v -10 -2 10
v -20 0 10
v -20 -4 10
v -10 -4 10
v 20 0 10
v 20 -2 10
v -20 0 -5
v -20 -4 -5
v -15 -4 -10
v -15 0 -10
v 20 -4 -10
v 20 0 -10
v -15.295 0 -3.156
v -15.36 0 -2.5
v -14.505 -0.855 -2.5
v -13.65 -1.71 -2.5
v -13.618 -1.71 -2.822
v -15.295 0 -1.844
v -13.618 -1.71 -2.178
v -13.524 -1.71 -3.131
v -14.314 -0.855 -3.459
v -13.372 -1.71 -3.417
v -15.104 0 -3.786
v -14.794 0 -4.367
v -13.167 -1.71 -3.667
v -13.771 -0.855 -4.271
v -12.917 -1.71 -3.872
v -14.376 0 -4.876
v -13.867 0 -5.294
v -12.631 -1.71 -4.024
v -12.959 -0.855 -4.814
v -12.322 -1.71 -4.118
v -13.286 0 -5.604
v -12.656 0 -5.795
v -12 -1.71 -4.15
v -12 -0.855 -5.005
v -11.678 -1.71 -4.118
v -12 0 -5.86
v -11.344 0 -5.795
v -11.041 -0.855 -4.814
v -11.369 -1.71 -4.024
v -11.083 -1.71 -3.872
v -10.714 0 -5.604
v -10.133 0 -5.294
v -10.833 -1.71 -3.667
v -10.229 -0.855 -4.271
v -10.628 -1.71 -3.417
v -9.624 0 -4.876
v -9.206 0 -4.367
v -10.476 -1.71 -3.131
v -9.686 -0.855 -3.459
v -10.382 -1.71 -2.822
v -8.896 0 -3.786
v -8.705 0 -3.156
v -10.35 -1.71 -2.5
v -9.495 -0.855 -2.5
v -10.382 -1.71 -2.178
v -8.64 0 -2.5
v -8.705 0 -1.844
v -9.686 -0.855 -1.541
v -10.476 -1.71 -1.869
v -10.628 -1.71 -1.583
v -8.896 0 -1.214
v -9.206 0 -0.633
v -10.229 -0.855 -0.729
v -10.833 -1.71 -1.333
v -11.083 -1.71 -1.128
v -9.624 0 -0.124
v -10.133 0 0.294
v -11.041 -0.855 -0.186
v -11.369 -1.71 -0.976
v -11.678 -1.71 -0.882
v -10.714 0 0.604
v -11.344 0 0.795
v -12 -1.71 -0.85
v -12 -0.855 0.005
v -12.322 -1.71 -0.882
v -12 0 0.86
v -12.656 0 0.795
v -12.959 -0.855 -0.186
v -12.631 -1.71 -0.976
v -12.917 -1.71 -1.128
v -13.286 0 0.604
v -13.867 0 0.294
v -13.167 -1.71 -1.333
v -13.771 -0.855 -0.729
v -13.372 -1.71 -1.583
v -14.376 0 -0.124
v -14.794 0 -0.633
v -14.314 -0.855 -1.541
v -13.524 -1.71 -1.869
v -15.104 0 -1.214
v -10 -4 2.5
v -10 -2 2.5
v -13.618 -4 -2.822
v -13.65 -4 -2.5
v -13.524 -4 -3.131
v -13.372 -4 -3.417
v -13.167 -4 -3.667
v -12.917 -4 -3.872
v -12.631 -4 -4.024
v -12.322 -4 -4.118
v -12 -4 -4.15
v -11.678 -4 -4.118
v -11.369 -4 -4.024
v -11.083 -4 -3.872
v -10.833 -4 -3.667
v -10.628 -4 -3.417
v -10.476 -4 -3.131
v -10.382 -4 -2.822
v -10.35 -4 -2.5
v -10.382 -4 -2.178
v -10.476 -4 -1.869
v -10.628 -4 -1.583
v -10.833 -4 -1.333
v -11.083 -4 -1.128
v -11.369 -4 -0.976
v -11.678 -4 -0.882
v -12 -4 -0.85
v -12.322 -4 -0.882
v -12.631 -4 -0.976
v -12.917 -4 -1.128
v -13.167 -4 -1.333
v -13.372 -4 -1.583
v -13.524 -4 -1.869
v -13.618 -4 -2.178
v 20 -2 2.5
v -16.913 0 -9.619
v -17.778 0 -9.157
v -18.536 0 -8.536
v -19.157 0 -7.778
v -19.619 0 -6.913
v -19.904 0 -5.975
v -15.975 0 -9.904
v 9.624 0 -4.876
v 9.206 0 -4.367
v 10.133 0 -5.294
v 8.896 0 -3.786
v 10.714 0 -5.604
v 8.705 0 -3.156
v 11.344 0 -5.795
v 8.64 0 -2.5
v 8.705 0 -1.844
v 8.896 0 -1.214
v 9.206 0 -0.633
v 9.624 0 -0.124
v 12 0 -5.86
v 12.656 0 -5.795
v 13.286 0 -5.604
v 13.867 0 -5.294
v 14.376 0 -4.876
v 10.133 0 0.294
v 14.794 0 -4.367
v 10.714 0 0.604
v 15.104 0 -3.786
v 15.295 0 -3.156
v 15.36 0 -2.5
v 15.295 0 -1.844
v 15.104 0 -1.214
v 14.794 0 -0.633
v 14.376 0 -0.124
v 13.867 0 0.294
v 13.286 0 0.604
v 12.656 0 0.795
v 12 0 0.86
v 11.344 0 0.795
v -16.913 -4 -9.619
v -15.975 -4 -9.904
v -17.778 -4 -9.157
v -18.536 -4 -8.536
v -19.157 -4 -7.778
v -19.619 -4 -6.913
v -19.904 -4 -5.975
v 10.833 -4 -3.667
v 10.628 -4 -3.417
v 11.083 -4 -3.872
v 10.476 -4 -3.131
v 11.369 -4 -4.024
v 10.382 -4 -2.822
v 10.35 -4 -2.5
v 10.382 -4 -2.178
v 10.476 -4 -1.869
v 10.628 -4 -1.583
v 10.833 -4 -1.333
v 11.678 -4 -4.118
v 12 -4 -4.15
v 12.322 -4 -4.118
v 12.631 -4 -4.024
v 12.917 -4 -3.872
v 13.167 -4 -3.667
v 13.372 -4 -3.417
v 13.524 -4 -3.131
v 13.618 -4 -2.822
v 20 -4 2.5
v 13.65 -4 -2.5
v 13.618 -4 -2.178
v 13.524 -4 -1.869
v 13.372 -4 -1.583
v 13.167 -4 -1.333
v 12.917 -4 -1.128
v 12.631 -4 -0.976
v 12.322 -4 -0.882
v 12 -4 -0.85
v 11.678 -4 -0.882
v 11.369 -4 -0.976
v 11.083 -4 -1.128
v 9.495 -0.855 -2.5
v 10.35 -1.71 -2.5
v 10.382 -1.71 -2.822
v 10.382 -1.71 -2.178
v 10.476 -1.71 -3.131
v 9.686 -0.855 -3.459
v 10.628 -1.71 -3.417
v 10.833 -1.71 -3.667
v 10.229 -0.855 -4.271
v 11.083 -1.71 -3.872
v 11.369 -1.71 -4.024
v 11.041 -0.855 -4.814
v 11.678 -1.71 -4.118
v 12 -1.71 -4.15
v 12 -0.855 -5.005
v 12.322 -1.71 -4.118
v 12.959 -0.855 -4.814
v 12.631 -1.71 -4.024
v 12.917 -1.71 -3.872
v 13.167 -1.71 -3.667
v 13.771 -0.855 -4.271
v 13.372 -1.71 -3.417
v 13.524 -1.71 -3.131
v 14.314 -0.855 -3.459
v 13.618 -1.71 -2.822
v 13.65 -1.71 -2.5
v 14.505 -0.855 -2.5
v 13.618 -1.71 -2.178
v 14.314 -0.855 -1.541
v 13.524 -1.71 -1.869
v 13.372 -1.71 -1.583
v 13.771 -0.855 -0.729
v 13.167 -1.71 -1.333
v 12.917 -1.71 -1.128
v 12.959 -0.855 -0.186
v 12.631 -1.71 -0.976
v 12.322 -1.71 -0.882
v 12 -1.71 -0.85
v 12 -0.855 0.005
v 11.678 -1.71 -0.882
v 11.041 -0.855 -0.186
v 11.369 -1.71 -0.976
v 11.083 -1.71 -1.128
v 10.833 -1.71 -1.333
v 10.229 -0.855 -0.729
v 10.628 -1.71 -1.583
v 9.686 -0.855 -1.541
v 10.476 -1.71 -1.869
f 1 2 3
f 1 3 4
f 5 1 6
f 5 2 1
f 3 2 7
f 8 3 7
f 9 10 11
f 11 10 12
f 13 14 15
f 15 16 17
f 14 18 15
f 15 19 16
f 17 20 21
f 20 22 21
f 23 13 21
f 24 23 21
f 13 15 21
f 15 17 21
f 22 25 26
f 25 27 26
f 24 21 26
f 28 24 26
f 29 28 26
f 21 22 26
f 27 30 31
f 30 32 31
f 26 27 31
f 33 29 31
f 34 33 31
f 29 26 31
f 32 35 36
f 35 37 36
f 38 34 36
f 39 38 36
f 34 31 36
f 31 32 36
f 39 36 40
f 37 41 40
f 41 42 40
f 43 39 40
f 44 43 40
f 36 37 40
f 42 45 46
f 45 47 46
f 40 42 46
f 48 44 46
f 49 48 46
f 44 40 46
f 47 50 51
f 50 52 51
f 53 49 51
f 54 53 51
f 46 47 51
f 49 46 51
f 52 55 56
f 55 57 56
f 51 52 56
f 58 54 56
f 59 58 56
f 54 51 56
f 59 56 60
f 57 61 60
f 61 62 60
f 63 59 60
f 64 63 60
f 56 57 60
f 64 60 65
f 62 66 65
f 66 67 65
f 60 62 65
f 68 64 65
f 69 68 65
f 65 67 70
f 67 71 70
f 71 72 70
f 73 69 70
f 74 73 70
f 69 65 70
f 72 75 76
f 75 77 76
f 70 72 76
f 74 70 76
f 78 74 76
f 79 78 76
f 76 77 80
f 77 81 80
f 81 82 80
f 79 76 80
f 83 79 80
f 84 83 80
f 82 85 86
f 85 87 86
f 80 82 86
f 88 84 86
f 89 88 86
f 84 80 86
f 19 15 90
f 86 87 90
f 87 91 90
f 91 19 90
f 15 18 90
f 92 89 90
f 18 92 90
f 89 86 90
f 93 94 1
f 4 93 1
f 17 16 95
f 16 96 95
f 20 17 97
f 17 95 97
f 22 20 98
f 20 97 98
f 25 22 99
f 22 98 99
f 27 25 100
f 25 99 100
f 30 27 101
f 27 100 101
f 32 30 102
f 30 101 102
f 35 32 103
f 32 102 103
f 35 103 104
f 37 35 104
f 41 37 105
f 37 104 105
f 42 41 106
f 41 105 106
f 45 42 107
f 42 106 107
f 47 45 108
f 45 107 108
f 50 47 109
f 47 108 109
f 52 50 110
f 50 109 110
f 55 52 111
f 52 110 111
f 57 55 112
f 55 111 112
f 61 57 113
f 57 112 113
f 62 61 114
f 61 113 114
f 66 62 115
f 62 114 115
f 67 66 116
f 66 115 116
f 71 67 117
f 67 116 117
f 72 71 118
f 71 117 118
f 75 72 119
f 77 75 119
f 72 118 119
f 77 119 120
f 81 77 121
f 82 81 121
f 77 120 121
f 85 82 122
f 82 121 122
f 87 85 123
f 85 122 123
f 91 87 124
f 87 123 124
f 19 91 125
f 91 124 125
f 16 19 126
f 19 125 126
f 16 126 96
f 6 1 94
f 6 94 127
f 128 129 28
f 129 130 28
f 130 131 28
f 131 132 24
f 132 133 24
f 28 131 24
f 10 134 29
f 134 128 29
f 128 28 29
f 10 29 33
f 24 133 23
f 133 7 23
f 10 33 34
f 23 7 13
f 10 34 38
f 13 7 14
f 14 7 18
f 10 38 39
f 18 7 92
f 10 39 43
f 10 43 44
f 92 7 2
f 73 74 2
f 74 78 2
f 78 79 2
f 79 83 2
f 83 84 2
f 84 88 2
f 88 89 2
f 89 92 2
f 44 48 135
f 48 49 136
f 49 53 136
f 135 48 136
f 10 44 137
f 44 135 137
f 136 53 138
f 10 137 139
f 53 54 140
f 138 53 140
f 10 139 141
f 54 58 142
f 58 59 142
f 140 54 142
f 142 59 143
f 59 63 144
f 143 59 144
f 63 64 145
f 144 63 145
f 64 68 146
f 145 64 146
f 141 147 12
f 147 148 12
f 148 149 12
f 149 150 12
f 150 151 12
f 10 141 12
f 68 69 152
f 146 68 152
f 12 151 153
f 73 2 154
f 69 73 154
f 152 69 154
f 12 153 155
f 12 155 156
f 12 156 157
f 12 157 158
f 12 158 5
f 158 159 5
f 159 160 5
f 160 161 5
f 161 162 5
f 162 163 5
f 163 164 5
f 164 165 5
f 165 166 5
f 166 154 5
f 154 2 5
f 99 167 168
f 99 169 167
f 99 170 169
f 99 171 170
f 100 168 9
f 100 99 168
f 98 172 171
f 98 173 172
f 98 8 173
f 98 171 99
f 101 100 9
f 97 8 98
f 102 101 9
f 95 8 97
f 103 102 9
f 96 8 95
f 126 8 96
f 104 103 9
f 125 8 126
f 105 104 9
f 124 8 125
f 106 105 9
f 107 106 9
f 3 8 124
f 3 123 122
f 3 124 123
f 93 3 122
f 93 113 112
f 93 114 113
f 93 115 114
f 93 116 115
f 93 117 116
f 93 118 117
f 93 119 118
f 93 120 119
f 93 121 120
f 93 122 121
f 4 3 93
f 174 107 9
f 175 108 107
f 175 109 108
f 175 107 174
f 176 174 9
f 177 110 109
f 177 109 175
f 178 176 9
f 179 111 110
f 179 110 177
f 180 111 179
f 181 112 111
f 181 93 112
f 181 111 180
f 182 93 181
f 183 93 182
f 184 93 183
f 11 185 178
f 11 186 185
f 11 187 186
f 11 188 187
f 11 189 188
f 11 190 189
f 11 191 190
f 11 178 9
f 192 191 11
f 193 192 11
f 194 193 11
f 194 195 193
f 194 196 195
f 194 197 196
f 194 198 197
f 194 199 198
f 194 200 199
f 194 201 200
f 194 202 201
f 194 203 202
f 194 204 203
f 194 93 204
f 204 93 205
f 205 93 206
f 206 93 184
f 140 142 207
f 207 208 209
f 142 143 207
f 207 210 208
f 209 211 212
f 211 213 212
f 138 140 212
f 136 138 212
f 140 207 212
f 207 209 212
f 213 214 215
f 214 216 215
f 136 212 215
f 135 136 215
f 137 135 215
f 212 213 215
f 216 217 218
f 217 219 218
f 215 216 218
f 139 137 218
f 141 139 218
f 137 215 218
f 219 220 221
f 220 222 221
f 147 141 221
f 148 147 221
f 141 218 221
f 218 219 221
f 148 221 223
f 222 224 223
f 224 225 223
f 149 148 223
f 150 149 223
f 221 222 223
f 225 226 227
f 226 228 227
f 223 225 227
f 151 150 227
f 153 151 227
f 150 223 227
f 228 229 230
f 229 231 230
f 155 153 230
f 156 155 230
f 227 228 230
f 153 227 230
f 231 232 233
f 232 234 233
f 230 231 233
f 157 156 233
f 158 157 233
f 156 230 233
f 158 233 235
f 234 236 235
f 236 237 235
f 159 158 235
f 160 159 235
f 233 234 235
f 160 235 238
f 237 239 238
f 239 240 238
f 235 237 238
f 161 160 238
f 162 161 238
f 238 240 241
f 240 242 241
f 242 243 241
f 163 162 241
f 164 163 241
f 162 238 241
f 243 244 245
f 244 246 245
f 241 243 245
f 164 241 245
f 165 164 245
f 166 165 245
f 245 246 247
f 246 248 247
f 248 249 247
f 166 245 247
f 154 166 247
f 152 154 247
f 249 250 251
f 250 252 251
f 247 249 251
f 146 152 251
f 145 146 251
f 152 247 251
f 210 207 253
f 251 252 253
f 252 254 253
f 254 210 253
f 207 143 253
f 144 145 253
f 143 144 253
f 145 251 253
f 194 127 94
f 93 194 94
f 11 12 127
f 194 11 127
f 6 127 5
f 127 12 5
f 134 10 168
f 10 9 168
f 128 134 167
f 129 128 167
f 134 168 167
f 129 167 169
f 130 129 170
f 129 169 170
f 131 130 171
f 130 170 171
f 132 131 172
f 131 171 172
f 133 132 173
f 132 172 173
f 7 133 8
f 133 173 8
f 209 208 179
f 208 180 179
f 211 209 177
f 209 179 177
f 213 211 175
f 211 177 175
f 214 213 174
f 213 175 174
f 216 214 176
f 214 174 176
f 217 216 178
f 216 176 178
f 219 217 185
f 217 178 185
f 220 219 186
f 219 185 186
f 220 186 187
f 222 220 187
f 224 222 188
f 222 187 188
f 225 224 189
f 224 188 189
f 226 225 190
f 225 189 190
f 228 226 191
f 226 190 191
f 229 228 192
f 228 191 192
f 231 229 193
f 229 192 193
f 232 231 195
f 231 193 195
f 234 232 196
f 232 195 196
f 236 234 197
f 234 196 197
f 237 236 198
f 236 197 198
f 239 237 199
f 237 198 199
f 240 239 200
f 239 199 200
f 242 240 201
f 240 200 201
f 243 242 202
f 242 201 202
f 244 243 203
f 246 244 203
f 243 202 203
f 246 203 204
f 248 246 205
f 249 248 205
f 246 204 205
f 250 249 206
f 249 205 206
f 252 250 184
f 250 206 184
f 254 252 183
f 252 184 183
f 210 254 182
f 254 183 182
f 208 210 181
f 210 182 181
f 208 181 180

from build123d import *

# Parameters (mm, degrees)
F0_W           = 30
F0_H           = 7.5
F1_DEPTH       = 2
F0_W_2         = 10
F2_DEPTH       = 4
F3_D           = 3.3
F3_CSINK_D     = 6.72
F3_CSINK_ANGLE = 90
F4_R           = 5


with BuildPart() as f1:
    # F0 (on Front) → F1 (new body)
    with BuildSketch(Plane.XZ):
        with Locations((5, 6.25)):
            Rectangle(F0_W, F0_H)
    extrude(amount=F1_DEPTH)

    # F0 (on Front) → F2 (join)
    with BuildSketch(Plane.XZ):
        Polygon((-20, -10), (20, -10), (20, 2.5), (-10, 2.5), (-20, 2.5), align=None)
        with Locations((-15, 6.25)):
            Rectangle(F0_W_2, F0_H)
    extrude(amount=F2_DEPTH)

    # F3 (through all)
    with Locations(Plane(origin=(0, 0, 0), x_dir=(1, 0, 0), z_dir=(0, 1, 0))):
        with Locations((-12, 2.5), (12, 2.5)):
            CounterSinkHole(F3_D / 2, F3_CSINK_D / 2, counter_sink_angle=F3_CSINK_ANGLE)

    # F4
    f4_edges = [f1.edges().sort_by_distance(p)[0] for p in [
        (-20, -2, -10),
    ]]
    fillet(f4_edges, radius=F4_R)


solid = f1.part
